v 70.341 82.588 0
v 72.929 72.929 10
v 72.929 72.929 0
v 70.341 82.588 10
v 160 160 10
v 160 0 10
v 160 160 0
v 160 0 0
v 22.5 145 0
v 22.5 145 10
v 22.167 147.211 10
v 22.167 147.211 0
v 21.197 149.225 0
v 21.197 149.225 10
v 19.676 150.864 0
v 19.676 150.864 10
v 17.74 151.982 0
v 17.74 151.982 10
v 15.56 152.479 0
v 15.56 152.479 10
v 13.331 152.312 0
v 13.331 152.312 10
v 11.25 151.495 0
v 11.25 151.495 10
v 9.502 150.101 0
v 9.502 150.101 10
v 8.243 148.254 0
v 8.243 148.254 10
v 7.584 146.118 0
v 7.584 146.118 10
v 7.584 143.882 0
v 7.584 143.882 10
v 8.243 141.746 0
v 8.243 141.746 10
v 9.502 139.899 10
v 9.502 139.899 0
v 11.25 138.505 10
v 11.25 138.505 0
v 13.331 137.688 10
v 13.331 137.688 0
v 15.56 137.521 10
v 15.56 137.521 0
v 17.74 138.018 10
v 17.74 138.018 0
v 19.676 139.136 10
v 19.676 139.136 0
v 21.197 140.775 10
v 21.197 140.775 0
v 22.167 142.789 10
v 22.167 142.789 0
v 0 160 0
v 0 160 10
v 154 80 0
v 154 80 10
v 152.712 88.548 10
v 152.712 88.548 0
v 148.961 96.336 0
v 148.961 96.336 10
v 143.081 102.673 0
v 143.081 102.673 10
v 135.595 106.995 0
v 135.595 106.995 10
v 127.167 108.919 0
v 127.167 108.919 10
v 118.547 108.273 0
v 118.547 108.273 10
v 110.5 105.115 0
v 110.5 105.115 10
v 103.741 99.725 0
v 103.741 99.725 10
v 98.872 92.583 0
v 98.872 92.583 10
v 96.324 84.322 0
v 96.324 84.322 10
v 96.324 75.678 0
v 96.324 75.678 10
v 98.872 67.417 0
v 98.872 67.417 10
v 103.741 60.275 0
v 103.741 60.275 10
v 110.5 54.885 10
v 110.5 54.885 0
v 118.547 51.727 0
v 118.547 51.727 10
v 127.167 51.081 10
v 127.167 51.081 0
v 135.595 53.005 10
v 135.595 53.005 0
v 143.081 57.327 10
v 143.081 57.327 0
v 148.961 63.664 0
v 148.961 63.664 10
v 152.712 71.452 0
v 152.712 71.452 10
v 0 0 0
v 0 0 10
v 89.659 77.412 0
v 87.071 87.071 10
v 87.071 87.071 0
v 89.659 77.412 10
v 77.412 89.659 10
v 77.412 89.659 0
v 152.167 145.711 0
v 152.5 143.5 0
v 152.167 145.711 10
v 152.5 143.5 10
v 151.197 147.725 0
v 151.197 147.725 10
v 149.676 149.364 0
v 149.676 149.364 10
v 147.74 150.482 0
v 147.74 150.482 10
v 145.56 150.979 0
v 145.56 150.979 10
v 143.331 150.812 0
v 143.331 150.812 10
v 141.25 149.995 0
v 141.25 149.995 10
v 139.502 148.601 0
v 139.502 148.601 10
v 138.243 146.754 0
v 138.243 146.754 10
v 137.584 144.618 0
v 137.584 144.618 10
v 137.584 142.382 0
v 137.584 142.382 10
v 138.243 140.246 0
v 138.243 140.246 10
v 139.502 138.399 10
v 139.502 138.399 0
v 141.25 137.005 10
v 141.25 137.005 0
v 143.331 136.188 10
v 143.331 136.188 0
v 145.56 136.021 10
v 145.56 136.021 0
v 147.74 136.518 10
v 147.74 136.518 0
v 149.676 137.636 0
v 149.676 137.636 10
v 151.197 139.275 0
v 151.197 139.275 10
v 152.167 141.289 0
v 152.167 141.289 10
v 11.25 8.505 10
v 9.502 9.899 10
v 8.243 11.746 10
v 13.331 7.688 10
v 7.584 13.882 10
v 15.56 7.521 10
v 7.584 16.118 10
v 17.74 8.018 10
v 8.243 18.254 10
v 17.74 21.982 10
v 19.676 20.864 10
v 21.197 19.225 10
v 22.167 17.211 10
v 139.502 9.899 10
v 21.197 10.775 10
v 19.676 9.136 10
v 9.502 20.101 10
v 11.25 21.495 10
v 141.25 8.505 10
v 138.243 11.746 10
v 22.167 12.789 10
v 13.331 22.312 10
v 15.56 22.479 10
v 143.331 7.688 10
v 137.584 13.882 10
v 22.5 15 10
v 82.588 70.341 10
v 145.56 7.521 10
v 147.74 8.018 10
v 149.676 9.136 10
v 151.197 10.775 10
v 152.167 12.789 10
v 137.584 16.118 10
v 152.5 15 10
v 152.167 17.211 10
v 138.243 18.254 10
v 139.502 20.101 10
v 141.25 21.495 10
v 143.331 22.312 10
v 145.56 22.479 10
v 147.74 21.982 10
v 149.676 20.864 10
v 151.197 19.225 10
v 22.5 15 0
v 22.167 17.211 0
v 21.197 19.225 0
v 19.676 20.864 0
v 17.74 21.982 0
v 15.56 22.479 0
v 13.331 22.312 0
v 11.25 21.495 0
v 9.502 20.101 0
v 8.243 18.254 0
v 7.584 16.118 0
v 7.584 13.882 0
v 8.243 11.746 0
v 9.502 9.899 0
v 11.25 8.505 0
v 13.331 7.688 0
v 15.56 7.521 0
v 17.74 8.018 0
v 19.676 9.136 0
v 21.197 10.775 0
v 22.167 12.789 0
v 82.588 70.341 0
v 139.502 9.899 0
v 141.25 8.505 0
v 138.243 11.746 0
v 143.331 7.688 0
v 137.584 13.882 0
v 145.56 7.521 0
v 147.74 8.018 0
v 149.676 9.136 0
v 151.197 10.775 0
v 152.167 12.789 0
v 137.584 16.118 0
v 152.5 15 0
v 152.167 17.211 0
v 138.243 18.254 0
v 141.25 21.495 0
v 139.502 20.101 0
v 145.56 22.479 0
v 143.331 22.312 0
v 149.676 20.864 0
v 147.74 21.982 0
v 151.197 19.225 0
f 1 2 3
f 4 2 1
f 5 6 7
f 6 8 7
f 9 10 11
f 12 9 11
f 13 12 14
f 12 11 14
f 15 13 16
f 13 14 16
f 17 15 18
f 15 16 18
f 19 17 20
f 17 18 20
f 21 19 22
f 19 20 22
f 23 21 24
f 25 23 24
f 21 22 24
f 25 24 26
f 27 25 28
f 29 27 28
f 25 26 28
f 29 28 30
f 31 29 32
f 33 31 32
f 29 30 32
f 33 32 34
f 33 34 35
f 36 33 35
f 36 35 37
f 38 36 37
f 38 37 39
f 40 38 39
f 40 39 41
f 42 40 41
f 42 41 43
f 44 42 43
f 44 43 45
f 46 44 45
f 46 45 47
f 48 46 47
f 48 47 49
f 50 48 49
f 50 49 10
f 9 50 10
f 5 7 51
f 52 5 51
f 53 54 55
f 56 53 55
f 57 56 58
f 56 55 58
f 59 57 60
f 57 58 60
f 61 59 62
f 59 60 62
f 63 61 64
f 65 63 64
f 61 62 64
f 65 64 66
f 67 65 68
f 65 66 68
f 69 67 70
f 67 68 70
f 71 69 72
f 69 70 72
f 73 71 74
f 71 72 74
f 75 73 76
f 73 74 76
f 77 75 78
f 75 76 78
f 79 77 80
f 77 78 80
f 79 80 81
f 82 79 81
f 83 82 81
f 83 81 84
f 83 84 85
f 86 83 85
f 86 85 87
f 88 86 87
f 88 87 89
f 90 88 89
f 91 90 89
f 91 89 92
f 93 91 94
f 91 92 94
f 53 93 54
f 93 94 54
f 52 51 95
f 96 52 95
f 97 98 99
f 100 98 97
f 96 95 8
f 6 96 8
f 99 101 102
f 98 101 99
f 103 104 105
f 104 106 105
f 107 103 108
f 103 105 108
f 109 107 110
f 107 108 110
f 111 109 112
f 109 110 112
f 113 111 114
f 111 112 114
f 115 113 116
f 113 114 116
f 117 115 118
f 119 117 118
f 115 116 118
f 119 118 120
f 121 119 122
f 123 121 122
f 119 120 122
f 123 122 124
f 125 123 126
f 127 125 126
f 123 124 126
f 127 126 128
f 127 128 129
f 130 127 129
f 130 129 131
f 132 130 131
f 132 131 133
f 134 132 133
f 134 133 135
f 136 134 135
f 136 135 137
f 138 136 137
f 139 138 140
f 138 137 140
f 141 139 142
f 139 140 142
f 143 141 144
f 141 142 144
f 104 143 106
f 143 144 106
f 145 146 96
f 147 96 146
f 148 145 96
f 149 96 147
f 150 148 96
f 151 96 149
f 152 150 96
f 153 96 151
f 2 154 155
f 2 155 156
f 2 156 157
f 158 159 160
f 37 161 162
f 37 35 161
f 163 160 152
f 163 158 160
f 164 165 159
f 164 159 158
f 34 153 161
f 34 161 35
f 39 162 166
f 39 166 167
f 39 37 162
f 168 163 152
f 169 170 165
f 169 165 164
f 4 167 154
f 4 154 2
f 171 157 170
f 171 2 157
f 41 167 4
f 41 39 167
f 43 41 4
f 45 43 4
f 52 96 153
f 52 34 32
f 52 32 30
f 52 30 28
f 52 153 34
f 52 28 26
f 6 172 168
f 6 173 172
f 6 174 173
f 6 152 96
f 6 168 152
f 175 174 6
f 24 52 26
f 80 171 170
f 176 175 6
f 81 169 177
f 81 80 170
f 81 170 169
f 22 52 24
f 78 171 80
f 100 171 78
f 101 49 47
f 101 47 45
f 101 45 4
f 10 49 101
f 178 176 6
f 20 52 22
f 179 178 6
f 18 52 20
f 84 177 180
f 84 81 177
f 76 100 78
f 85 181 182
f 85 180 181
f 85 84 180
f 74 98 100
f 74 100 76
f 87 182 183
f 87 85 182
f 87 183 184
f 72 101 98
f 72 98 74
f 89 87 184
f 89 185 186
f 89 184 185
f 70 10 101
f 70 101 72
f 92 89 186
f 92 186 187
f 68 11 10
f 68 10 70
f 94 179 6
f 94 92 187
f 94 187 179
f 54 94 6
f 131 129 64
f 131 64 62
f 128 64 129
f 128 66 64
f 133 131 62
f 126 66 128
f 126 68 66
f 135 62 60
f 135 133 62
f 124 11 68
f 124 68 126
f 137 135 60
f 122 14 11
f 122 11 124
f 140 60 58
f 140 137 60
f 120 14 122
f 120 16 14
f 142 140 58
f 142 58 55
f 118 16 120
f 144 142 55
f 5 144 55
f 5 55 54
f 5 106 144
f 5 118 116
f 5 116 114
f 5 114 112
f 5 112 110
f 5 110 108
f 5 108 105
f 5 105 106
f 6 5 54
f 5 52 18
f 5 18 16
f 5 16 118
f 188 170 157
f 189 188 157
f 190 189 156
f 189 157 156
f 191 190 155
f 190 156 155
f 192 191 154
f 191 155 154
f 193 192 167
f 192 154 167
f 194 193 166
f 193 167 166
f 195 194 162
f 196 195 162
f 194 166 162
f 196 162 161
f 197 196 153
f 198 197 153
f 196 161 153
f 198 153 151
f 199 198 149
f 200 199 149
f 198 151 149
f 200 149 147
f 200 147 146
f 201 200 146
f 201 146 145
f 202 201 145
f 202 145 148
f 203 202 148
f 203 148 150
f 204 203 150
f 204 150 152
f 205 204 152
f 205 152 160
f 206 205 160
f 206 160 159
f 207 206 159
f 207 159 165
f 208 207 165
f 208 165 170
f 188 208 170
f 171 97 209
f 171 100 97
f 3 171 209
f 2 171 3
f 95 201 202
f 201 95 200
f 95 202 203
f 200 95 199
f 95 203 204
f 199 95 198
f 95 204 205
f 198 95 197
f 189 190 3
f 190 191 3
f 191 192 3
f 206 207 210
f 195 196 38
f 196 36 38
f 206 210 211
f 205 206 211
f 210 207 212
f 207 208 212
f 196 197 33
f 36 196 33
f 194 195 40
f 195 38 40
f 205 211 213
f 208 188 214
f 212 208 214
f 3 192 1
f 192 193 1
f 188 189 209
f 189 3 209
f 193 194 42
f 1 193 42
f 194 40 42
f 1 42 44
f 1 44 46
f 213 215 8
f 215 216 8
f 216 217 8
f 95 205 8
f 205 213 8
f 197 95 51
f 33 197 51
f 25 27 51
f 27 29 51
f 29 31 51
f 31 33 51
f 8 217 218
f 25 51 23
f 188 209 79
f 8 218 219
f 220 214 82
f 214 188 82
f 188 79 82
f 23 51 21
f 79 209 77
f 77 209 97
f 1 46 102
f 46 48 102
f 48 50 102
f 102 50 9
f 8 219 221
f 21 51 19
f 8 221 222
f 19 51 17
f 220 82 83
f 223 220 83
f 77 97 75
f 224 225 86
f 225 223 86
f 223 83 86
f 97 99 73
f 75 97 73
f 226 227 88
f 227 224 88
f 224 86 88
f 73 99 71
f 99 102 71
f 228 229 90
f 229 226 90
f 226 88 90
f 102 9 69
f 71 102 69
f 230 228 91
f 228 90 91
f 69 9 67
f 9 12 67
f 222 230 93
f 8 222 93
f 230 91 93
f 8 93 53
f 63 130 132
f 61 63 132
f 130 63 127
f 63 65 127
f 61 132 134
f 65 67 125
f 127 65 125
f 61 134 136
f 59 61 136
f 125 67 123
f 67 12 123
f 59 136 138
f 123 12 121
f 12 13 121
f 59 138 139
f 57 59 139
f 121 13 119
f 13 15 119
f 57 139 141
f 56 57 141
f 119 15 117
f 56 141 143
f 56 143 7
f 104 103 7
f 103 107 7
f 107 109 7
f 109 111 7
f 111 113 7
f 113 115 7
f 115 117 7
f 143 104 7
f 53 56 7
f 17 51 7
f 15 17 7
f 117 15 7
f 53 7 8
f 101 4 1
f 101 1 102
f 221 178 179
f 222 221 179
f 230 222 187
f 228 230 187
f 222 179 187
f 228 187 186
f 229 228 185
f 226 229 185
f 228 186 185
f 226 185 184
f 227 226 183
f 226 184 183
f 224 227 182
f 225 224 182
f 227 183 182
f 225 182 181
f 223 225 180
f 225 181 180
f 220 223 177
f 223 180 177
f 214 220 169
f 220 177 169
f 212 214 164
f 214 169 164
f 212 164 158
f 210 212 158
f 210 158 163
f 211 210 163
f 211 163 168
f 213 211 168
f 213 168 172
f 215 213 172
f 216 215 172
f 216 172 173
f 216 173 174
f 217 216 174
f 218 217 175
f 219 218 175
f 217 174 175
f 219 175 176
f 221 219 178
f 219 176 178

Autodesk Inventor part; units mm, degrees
ref_plane "YZ Plane" through (0, 0, 0) normal (1, 0, 0) x (0, 1, 0)
ref_plane "XZ Plane" through (0, 0, 0) normal (0, 1, 0) x (-1, 0, 0)
ref_plane "XY Plane" through (0, 0, 0) normal (0, 0, 1) x (1, 0, 0)
sketch "Sketch1" plane through (0, 0, 0) normal (0, 0, 1) x (1, 0, 0)
  line L0 (0, 0) -> (160, 0)
  line L1 (160, 0) -> (160, 160)
  line L2 (160, 160) -> (0, 160)
  line L3 (0, 160) -> (0, 0)
  dimension "d0" = 160
  dimension "d1" = 160
extrude "Extrusion1" add sketch "Sketch1" along normal blind 10
sketch "Sketch2" plane through (0, 0, 10) normal (0, 0, 1) x (1, 0, 0)
  line L0 (0, 0) -> (160, 0) projected
  line L1 (0, 0) -> (15, 0)
  line L2 (15, 0) -> (15, 15)
  line L3 (160, 160) -> (0, 160) projected
  line L4 (0, 160) -> (15, 160)
  line L5 (15, 160) -> (15, 145)
  line L6 (160, 0) -> (160, 160) projected
  line L7 (160, 160) -> (145, 160)
  line L8 (145, 160) -> (145, 143.5)
  line L9 (160, 0) -> (160, 15)
  line L10 (160, 15) -> (145, 15)
  circle A0 centre (15, 145) radius 7.5
  circle A1 centre (145, 143.5) radius 7.5
  circle A2 centre (145, 15) radius 7.5
  circle A3 centre (15, 15) radius 7.5
  dimension "d4" = 15
  dimension "d5" = 15
  dimension "d6" = 15
  dimension "d7" = 15
  dimension "d8" = 15
  dimension "d9" = 16.5
  dimension "d10" = 15
  dimension "d11" = 15
  dimension "d12" = 15
  dimension "d13" = 15
  dimension "d14" = 15
  dimension "d15" = 15
extrude "Extrusion2" cut sketch "Sketch2" against normal blind 10
sketch "Sketch3" plane through (0, 0, 10) normal (0, 0, 1) x (1, 0, 0)
  line L0 (0, 160) -> (0, 0) projected
  line L1 (0, 0) -> (80, 0)
  line L2 (0, 0) -> (160, 0) projected
  line L3 (80, 0) -> (0, 0)
  line L4 (0, 0) -> (80, 0)
  dimension "d18" = 80
  dimension "d19" = 80
  dimension "d20" = 80
sketch "Sketch4" plane through (0, 0, 10) normal (0, 0, 1) x (1, 0, 0)
  line L0 (0, 0) -> (160, 0) projected
  line L1 (0, 0) -> (0, 80)
  line L2 (0, 160) -> (0, 0) projected
  line L3 (0, 80) -> (80, 80)
  line L4 (87.0711, 87.0711) -> (89.6593, 77.4118)
  line L5 (89.6593, 77.4118) -> (82.5882, 70.3407)
  line L6 (82.5882, 70.3407) -> (72.9289, 72.9289)
  line L7 (72.9289, 72.9289) -> (70.3407, 82.5882)
  line L8 (70.3407, 82.5882) -> (77.4118, 89.6593)
  line L9 (77.4118, 89.6593) -> (87.0711, 87.0711)
  line L10 (160, 0) -> (160, 160) projected
  line L11 (160, 160) -> (160, 80)
  dimension "d21" = 80
  dimension "d22" = 80
  dimension "d23" = 10
  dimension "d24" = 80
sketch "Sketch5" plane through (0, 0, 10) normal (0, 0, 1) x (1, 0, 0)
  line L0 (160, 0) -> (160, 160) projected
  line L1 (160, 80) -> (125, 80)
  circle A0 centre (125, 80) radius 29
  point P0 (0, 0)
  dimension "d25" = 35
  dimension "d26" = 58
extrude "Extrusion3" cut sketch "Sketch4" against normal blind 10
extrude "Extrusion4" cut sketch "Sketch5" against normal blind 10
properties part number "102"
